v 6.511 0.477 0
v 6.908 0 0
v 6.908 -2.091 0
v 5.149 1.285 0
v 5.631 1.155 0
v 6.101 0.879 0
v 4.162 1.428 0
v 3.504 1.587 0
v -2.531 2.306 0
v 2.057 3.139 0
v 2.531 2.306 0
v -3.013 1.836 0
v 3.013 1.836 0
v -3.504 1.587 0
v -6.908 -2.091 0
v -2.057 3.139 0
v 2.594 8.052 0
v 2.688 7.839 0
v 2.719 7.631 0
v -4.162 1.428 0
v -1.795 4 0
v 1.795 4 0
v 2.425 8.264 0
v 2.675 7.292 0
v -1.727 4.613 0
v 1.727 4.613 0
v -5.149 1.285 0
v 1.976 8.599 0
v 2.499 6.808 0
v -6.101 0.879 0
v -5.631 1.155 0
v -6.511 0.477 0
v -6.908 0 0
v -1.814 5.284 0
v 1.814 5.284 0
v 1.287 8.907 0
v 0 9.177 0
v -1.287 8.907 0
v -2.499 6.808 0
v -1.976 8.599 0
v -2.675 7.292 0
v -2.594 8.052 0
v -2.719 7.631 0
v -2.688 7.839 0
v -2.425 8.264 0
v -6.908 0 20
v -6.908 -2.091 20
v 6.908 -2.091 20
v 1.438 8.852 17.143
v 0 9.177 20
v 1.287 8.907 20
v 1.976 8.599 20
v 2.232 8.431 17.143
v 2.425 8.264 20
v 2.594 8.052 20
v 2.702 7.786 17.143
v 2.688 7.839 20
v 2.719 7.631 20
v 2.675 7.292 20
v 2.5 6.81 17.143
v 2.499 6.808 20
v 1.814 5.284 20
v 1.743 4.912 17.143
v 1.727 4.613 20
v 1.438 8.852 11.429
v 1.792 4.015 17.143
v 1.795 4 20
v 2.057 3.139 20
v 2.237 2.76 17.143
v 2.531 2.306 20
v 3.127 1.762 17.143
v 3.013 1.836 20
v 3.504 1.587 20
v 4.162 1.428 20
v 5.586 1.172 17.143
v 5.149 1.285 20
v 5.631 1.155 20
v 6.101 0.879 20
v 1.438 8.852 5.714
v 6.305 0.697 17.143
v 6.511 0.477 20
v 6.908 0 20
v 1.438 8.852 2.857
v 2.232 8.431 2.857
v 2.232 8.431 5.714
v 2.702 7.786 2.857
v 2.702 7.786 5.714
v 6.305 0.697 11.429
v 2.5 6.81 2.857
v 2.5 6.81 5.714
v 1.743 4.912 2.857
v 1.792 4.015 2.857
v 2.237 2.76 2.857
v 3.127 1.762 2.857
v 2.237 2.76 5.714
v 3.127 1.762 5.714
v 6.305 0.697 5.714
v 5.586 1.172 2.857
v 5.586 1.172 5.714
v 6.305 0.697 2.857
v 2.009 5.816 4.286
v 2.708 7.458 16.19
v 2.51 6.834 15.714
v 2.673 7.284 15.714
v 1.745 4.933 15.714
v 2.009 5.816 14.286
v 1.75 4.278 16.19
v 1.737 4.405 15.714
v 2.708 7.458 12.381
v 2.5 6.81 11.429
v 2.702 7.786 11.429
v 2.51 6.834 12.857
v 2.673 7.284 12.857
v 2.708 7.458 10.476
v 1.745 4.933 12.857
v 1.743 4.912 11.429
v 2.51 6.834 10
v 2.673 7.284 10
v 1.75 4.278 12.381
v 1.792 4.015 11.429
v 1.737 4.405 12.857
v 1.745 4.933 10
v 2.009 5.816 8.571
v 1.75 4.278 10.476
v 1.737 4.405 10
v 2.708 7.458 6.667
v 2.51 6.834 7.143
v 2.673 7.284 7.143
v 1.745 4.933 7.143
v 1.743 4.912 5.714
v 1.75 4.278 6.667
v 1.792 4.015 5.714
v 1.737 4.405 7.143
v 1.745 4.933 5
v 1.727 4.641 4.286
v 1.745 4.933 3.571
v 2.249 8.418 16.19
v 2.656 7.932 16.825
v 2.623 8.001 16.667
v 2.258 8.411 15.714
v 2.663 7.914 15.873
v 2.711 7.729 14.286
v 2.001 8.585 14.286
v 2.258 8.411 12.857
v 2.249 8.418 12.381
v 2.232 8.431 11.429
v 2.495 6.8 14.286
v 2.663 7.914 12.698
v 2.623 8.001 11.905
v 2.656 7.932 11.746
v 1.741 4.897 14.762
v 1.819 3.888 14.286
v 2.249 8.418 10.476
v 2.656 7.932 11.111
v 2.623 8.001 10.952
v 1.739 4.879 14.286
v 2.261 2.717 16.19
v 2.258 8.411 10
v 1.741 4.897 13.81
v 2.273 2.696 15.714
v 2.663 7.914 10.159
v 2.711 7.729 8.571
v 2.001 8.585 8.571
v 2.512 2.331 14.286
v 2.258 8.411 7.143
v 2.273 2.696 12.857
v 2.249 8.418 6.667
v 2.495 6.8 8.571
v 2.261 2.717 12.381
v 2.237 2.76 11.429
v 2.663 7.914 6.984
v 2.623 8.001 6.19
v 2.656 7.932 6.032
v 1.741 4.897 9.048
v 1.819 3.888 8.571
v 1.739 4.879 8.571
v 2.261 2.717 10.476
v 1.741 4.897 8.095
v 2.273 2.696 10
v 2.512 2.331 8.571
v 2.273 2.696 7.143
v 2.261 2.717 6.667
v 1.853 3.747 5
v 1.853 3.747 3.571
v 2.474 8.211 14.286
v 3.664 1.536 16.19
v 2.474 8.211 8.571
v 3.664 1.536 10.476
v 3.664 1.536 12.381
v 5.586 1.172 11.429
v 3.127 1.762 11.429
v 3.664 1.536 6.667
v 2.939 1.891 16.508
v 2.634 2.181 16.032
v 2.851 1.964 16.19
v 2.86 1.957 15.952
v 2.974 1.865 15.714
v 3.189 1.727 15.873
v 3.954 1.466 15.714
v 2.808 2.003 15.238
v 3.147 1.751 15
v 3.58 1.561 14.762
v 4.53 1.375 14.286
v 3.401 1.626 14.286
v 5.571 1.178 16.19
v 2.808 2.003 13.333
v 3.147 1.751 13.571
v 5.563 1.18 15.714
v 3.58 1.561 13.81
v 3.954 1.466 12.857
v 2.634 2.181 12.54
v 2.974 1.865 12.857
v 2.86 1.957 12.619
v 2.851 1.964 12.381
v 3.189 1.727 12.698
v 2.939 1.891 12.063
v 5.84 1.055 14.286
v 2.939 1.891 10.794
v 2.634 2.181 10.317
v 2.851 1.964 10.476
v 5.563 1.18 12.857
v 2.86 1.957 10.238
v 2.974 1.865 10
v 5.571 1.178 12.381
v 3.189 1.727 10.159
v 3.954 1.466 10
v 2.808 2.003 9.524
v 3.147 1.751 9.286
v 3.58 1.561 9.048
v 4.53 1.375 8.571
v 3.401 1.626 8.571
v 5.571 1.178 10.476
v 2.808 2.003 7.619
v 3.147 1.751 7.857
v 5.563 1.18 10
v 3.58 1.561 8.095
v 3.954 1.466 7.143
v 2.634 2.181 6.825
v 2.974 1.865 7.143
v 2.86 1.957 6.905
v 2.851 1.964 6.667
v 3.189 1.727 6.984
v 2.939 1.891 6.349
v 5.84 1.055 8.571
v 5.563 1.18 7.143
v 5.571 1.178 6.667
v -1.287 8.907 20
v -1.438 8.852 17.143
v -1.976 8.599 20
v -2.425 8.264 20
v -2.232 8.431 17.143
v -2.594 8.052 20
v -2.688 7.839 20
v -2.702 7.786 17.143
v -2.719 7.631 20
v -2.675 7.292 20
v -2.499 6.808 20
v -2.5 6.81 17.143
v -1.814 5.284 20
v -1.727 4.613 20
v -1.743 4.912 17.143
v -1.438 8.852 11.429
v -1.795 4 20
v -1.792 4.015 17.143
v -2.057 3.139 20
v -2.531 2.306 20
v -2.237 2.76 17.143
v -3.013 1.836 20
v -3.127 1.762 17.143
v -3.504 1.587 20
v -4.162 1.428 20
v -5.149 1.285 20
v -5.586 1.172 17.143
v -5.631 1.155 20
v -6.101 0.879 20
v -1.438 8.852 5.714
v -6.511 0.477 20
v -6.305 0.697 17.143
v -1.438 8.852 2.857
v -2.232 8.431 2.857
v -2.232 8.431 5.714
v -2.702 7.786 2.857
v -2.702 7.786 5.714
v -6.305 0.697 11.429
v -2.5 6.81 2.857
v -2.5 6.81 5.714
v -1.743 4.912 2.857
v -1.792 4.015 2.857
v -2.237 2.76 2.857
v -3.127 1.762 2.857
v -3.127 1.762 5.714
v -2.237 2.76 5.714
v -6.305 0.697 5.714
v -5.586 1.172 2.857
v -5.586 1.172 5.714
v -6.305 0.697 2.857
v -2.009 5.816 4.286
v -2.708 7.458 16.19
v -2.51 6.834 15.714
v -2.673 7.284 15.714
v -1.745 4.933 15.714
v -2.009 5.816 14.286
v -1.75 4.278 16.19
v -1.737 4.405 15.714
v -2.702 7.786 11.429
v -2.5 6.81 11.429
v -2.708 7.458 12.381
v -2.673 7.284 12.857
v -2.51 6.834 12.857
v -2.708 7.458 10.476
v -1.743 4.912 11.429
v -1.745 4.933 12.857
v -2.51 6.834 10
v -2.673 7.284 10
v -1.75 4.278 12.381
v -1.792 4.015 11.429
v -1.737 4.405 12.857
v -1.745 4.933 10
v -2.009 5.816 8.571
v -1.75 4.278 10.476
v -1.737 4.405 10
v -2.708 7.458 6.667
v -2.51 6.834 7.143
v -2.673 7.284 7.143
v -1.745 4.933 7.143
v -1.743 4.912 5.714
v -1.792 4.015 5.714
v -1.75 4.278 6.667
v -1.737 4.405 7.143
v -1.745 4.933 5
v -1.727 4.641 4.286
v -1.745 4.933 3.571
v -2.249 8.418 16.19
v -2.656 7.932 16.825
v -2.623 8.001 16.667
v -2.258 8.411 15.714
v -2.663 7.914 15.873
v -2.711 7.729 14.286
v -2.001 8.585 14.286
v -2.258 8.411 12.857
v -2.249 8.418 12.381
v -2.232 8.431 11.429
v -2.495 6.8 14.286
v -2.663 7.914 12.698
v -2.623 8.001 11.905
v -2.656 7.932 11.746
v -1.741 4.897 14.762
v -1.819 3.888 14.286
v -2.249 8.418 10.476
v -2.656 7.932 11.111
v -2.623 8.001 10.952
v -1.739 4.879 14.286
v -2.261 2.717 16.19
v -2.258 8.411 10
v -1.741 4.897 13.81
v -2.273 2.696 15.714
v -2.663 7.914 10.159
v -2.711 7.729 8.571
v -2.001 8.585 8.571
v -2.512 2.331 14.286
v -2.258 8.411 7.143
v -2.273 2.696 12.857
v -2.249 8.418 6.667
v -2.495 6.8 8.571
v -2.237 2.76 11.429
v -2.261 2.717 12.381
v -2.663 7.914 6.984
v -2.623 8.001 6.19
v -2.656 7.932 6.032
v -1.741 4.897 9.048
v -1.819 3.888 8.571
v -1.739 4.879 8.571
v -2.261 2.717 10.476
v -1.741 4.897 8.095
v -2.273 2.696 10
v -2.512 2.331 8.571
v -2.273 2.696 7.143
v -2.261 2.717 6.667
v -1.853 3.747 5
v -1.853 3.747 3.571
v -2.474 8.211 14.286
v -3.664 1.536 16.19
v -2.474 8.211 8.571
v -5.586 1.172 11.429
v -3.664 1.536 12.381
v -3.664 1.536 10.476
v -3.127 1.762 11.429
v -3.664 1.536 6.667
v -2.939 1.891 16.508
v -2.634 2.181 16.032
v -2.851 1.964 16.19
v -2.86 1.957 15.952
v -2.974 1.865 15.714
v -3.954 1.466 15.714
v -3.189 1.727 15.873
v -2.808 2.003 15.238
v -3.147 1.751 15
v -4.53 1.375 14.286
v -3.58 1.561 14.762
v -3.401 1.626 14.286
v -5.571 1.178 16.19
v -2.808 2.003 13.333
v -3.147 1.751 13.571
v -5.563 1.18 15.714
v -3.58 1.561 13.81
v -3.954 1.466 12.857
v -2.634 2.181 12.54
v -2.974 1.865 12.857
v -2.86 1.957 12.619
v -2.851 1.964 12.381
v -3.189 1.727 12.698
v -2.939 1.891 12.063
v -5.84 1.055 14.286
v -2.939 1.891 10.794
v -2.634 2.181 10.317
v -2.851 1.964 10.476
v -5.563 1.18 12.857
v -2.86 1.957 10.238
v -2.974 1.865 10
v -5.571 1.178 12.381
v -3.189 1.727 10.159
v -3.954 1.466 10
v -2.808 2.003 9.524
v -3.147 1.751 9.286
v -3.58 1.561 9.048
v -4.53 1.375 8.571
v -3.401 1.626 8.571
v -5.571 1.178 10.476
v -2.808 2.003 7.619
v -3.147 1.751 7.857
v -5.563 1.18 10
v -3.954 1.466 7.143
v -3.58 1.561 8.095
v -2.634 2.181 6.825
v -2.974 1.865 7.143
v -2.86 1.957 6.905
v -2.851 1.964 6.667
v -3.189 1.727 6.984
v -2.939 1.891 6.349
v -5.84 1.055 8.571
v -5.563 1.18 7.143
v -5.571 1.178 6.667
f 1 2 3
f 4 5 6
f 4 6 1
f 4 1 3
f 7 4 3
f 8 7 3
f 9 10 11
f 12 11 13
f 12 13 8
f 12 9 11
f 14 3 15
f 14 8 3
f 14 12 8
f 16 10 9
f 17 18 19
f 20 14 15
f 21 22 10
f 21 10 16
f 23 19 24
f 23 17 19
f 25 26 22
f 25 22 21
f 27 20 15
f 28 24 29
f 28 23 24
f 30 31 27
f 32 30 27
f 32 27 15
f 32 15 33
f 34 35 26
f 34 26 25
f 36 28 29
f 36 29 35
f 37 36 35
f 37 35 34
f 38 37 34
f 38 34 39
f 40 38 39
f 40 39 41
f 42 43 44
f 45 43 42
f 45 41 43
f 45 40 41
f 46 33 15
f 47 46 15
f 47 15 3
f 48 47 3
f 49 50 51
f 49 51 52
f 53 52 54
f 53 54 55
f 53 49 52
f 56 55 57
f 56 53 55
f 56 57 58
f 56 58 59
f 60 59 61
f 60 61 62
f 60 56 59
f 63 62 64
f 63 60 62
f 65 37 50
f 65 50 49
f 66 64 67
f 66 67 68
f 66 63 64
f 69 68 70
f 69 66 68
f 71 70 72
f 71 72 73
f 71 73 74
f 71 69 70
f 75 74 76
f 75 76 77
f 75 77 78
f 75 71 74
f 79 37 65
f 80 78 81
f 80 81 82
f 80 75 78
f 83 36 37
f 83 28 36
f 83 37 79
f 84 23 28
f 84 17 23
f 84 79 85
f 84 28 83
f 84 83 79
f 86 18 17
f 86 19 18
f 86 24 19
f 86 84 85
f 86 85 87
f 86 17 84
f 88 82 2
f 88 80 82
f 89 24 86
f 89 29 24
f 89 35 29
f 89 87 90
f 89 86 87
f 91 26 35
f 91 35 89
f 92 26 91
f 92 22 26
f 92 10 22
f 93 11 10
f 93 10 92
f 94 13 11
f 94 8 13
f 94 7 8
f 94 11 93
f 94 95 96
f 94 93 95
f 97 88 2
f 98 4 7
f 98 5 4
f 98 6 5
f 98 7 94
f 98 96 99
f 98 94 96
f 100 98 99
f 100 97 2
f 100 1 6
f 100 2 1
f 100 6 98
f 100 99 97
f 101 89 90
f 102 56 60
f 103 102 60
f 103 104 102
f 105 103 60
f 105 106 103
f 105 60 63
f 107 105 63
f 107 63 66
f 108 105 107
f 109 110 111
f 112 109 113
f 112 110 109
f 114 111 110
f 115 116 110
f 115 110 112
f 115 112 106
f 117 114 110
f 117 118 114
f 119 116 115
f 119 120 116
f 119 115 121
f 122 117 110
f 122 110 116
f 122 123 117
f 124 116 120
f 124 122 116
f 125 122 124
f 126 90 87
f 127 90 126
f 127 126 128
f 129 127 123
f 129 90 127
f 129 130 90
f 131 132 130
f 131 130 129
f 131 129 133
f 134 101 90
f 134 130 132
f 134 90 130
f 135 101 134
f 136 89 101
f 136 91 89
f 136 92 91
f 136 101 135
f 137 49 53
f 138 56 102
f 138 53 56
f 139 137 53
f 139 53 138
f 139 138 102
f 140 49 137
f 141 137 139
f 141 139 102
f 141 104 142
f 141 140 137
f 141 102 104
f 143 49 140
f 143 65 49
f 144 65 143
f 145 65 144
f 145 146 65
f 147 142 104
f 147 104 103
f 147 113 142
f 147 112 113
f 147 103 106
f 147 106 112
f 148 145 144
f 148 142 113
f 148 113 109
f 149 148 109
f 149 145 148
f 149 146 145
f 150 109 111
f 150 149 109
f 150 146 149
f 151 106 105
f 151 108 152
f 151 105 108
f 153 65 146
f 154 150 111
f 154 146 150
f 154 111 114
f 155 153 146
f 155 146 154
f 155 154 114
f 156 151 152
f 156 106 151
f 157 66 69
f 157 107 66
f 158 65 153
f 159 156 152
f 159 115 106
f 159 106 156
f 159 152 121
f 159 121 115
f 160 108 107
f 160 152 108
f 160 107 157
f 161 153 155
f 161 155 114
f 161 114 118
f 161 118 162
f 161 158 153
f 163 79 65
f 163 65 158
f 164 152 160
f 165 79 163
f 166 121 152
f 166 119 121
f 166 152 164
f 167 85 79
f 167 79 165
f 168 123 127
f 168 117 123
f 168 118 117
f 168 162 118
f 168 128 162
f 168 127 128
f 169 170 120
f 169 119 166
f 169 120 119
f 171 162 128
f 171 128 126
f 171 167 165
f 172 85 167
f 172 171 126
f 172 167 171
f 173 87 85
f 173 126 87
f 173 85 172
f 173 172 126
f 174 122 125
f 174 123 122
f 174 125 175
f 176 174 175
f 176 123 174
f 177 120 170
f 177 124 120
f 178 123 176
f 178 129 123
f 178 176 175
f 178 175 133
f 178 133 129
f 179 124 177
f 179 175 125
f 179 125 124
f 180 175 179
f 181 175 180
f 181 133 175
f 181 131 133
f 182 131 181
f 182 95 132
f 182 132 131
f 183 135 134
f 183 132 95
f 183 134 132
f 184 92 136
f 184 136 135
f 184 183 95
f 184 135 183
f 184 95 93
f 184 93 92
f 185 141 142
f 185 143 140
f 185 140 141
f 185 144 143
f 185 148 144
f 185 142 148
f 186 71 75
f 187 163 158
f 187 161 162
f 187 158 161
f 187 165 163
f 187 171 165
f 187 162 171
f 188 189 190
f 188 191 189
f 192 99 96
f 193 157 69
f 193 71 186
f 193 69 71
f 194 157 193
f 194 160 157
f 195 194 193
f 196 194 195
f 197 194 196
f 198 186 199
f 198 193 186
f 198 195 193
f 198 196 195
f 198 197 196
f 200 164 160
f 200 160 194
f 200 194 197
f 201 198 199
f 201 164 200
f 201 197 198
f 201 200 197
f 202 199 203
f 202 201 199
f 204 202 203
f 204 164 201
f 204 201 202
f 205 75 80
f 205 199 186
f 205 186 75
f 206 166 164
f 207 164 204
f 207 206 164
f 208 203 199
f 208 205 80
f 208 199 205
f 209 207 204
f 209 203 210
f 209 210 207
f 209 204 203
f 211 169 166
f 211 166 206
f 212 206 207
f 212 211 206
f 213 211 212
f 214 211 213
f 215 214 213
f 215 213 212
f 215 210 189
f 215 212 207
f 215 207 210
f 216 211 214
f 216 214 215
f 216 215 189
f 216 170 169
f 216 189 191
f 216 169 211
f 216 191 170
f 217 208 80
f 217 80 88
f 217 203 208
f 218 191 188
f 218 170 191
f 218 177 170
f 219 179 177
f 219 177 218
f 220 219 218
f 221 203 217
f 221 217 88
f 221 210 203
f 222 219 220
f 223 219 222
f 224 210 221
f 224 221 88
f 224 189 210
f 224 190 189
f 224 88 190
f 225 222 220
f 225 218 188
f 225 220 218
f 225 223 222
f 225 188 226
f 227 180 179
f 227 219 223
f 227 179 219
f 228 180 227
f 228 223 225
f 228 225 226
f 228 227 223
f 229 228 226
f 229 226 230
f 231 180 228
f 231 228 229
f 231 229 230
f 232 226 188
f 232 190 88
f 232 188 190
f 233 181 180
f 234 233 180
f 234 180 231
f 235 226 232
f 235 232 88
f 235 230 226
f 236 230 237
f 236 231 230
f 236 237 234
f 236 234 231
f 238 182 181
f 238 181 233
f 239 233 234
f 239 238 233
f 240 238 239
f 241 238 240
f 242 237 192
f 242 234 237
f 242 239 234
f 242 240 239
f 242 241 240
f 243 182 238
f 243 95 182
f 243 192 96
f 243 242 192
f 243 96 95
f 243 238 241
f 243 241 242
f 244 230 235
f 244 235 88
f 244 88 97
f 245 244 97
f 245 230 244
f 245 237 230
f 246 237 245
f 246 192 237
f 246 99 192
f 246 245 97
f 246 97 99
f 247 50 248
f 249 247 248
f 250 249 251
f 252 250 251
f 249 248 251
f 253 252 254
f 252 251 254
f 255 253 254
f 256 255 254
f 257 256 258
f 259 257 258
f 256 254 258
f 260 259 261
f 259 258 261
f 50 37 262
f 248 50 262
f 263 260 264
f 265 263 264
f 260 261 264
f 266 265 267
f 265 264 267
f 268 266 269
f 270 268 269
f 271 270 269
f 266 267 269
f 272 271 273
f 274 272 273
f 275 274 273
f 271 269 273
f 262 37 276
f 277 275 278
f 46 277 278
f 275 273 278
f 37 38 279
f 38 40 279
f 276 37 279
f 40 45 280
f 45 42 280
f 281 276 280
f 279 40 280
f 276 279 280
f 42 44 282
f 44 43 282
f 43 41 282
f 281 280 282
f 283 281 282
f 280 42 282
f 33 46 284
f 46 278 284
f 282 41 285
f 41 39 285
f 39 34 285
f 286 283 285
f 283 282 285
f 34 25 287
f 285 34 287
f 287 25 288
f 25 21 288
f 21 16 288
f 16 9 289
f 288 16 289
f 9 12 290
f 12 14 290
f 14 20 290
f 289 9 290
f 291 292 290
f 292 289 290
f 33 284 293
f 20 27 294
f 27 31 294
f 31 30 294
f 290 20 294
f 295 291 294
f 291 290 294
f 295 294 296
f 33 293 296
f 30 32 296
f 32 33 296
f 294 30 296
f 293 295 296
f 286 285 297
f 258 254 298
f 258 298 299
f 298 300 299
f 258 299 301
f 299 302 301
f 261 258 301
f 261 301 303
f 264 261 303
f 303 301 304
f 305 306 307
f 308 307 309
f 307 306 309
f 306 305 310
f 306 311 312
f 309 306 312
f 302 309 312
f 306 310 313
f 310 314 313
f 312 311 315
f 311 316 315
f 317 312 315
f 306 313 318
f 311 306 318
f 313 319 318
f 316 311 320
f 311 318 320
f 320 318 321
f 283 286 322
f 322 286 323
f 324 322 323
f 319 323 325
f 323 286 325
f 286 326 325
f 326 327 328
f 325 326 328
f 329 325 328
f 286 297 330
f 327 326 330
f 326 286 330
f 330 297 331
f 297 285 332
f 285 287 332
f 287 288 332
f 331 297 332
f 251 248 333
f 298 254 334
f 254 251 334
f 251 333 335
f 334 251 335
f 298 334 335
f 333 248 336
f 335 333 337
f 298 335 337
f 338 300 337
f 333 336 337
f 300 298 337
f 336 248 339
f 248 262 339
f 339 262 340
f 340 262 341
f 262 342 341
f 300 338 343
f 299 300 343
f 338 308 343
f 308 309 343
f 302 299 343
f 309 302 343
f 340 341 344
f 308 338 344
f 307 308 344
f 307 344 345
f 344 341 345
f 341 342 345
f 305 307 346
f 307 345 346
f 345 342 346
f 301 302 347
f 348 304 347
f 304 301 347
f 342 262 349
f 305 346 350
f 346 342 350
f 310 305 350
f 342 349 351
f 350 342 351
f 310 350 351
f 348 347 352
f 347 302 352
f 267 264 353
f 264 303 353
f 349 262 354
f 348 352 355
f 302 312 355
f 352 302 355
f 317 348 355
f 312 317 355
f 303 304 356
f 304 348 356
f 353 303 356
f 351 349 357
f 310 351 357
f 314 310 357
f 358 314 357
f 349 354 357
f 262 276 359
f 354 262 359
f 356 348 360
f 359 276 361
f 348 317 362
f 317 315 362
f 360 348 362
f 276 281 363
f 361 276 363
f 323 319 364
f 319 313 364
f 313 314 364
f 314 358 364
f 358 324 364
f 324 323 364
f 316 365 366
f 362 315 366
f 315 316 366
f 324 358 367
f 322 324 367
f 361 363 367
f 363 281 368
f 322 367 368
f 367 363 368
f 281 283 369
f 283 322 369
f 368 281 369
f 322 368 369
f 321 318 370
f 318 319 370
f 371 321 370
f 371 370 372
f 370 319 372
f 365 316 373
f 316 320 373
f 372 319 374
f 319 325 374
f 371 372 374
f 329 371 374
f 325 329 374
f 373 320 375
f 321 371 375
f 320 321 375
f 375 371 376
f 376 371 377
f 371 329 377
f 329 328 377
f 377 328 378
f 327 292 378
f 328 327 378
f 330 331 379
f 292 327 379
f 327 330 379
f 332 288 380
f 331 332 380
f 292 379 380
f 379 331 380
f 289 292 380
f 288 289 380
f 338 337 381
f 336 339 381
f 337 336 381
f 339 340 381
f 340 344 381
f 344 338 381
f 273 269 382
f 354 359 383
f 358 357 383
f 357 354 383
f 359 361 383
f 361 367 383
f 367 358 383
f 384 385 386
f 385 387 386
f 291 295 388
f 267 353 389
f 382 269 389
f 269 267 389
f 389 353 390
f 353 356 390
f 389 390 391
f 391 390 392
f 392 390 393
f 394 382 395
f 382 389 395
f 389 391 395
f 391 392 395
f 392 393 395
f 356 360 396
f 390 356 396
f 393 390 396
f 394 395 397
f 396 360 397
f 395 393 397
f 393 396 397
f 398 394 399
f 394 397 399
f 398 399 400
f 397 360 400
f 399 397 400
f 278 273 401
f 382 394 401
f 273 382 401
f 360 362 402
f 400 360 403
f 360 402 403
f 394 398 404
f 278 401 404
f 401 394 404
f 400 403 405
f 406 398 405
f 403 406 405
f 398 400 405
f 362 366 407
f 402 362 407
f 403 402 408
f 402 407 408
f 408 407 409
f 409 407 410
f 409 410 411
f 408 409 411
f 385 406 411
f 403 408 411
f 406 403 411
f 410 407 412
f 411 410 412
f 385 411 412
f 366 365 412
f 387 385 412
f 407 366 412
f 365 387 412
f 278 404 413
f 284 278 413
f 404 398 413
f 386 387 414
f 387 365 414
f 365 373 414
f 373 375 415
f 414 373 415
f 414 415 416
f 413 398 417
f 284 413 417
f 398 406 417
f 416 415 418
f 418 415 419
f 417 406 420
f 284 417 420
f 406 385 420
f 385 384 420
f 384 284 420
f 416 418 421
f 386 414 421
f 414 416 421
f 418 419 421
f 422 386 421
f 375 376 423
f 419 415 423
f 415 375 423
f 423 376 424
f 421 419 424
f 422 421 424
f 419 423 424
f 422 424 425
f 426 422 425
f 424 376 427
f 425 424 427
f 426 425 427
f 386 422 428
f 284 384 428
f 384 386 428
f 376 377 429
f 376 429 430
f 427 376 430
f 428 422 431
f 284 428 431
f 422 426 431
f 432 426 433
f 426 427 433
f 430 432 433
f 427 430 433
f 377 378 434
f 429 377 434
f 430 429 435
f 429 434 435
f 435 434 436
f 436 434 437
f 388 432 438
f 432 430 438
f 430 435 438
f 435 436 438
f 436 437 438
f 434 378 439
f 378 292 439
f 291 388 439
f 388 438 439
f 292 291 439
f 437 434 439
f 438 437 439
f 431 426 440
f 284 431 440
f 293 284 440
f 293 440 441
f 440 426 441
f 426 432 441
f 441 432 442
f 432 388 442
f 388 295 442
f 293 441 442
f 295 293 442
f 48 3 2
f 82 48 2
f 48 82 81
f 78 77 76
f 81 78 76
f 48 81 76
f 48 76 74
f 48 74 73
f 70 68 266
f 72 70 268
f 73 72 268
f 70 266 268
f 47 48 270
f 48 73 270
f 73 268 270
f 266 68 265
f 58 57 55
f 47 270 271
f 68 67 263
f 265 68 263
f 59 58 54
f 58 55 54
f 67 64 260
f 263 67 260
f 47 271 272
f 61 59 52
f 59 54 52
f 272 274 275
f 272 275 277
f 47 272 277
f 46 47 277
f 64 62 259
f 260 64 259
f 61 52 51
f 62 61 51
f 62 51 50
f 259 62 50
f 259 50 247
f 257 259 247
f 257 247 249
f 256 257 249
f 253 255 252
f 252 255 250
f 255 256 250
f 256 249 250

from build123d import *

# Parameters (mm, degrees)
F1_DEPTH = 20


with BuildPart() as f1:
    # F0 (on Top) → F1 (new body)
    with BuildSketch(Plane.XY):
        with BuildLine():
            add(Edge.make_bspline(
                [(0, 9.1770394081), (0.4924283487, 9.1133954162), (1.3925154229, 8.976730575), (3.2987794271, 7.893214347), (1.7878215742, 5.7244761995), (1.5926609774, 4.0528109112), (2.8039640149, 1.21758996), (5.767748114, 1.5077992372), (6.4875198978, 0.5067326854), (6.9080890849, 0)],
                knots=[0, 0, 0, 0, 0.1235515279, 0.2543428284, 0.4030926569, 0.5383262258, 0.7029568389, 0.8647672066, 1, 1, 1, 1], degree=3))
            add(Edge.make_bspline(
                [(0, 9.1770394081), (-0.4924283487, 9.1133954162), (-1.3925154229, 8.976730575), (-3.2987794271, 7.893214347), (-1.7878215742, 5.7244761995), (-1.5926609774, 4.0528109112), (-2.8039640149, 1.21758996), (-5.767748114, 1.5077992372), (-6.4875198978, 0.5067326854), (-6.9080890849, 0)],
                knots=[0, 0, 0, 0, 0.1235515279, 0.2543428284, 0.4030926569, 0.5383262258, 0.7029568389, 0.8647672066, 1, 1, 1, 1], degree=3))
            Line((-6.9080890849, 0), (-6.9080890849, -2.0907530375))
            Line((-6.9080890849, -2.0907530375), (0, -2.0907530375))
            Line((0, -2.0907530375), (6.9080890849, -2.0907530375))
            Line((6.9080890849, -2.0907530375), (6.9080890849, 0))
        make_face()
    extrude(amount=F1_DEPTH)


solid = f1.part
